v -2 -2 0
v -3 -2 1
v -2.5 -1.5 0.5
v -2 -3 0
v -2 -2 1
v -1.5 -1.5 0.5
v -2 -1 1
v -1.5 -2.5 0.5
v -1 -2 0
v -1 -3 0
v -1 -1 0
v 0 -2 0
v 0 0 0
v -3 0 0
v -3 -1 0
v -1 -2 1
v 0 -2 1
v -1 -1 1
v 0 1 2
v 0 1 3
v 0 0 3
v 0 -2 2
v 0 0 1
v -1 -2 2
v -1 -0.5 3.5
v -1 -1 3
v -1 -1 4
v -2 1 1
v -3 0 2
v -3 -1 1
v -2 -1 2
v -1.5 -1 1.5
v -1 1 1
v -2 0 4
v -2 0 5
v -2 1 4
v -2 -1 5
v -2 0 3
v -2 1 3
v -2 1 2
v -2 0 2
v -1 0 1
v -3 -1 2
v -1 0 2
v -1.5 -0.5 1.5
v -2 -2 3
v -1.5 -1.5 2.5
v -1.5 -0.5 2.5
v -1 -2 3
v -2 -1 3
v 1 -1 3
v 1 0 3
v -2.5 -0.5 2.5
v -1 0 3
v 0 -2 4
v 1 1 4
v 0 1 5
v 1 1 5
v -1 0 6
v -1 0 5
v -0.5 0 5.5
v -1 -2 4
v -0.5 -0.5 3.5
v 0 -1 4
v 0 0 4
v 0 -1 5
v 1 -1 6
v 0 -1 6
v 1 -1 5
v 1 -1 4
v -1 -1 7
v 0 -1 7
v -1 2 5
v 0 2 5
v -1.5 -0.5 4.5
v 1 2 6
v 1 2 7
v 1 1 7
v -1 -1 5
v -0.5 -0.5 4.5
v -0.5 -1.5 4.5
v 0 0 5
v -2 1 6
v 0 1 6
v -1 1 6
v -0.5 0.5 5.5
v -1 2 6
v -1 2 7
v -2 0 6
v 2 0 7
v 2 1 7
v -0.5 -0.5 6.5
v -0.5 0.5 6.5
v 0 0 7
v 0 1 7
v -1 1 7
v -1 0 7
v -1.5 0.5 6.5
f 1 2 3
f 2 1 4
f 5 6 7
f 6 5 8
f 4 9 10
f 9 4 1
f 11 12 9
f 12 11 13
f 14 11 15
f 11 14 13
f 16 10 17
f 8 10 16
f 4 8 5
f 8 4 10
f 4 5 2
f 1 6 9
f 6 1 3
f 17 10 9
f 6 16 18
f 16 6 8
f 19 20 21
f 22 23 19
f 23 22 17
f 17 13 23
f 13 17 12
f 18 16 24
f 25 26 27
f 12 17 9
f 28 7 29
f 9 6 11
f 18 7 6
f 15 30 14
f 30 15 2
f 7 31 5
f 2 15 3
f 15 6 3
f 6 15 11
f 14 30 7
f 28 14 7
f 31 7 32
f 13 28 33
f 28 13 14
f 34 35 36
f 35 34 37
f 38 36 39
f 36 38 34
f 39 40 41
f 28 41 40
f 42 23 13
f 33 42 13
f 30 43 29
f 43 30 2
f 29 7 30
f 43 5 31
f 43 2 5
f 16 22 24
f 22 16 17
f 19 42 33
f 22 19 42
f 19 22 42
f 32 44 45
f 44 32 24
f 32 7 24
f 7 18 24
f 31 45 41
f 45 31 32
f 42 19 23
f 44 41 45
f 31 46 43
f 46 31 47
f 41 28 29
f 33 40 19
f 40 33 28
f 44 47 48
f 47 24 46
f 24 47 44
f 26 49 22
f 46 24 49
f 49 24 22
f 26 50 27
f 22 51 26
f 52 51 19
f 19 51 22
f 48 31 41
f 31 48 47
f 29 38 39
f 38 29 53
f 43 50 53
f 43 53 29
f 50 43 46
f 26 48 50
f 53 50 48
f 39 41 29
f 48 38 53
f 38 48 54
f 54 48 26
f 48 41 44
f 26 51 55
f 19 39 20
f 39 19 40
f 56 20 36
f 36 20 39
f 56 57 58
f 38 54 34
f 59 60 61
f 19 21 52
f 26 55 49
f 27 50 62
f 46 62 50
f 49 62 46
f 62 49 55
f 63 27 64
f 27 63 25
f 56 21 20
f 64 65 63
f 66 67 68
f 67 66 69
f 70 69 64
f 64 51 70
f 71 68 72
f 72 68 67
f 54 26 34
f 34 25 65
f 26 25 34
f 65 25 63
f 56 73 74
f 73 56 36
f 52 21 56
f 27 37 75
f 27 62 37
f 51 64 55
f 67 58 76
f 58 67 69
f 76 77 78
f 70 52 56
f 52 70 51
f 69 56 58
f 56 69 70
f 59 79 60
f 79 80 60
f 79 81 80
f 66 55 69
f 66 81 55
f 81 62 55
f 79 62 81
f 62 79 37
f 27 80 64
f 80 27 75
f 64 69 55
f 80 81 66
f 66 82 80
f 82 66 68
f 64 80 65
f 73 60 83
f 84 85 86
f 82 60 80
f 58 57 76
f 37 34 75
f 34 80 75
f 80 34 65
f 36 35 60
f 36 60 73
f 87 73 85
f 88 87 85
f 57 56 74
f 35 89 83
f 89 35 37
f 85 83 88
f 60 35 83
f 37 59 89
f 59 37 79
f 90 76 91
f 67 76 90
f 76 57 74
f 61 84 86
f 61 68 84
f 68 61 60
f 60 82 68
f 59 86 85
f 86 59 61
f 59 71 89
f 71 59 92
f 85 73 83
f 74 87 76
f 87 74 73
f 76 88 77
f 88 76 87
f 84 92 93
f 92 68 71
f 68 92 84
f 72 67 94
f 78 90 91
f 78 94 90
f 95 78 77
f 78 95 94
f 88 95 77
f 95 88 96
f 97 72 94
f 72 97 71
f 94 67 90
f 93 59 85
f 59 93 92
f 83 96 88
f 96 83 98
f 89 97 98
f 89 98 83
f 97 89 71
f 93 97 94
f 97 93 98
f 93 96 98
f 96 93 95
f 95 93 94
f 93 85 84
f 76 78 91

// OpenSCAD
module skew_cube(a,b) {
	multmatrix(m = [
		[1, 0, a, 0],
		[0, 1, b, 0],
		[0, 0, 1, 0]
	]) cube(size=1.00001);
}

module span_cube(x1,y1,x2,y2,z) {
	translate(v=[x1,y1,z])
	skew_cube(x2-x1,y2-y1);
}


union() {
span_cube(-2,-3,-3,-2,0);
span_cube(-2,-3,-1,-2,0);
span_cube(-1,-2,-1,-2,0);
span_cube(-1,-2,-2,-1,0);
span_cube(-1,-2,-1,-1,0);
span_cube(-3,-1,-3,-2,0);
span_cube(-3,-1,-2,-1,0);
span_cube(-3,-1,-2,0,0);
span_cube(-2,-1,-3,-2,0);
span_cube(-2,-1,-1,-2,0);
span_cube(-2,-1,-2,-1,0);
span_cube(-2,-1,-1,-1,0);
span_cube(-2,-1,-2,0,0);
span_cube(-1,-1,-1,-2,0);
span_cube(-1,-1,-2,-1,0);
span_cube(-1,-1,-1,-1,0);
span_cube(-1,-1,-2,0,0);
span_cube(-3,-2,-3,-1,1);
span_cube(-1,-2,-1,-2,1);
span_cube(-1,-2,-1,-1,1);
span_cube(-2,-1,-1,-2,1);
span_cube(-2,-1,-3,-1,1);
span_cube(-2,-1,-1,-1,1);
span_cube(-2,-1,-2,0,1);
span_cube(-2,-1,-1,0,1);
span_cube(-1,-1,-1,-2,1);
span_cube(-1,-1,-1,-1,1);
span_cube(-1,-1,-2,0,1);
span_cube(-1,-1,-1,0,1);
span_cube(-2,0,-3,-1,1);
span_cube(-2,0,-1,-1,1);
span_cube(-2,0,-2,0,1);
span_cube(-2,0,-1,0,1);
span_cube(-1,-2,-2,-2,2);
span_cube(-1,-2,-1,-1,2);
span_cube(-1,-2,0,-1,2);
span_cube(-3,-1,-2,-2,2);
span_cube(-3,-1,-2,0,2);
span_cube(-1,-1,-2,-2,2);
span_cube(-1,-1,-1,-1,2);
span_cube(-1,-1,0,-1,2);
span_cube(-1,-1,-2,0,2);
span_cube(-1,-1,-1,0,2);
span_cube(-2,0,-1,-1,2);
span_cube(-2,0,-2,0,2);
span_cube(-2,0,-1,0,2);
span_cube(-1,0,-1,-1,2);
span_cube(-1,0,0,-1,2);
span_cube(-1,0,-2,0,2);
span_cube(-1,0,-1,0,2);
span_cube(-2,-2,-1,-2,3);
span_cube(-1,-1,-1,-2,3);
span_cube(-1,-1,0,-1,3);
span_cube(-1,-1,-2,0,3);
span_cube(-1,-1,-1,0,3);
span_cube(-1,-1,0,0,3);
span_cube(0,-1,-1,-2,3);
span_cube(0,-1,0,-1,3);
span_cube(0,-1,-1,0,3);
span_cube(0,-1,0,0,3);
span_cube(-2,0,-2,0,3);
span_cube(-2,0,-1,0,3);
span_cube(-1,0,0,-1,3);
span_cube(-1,0,-2,0,3);
span_cube(-1,0,-1,0,3);
span_cube(-1,0,0,0,3);
span_cube(-1,-2,-2,-1,4);
span_cube(-1,-2,0,-1,4);
span_cube(0,-1,0,-1,4);
span_cube(0,-1,-1,0,4);
span_cube(0,-1,0,0,4);
span_cube(-2,0,-2,-1,4);
span_cube(-2,0,-1,0,4);
span_cube(-2,0,-1,1,4);
span_cube(-1,0,-2,-1,4);
span_cube(-1,0,0,-1,4);
span_cube(-1,0,-1,0,4);
span_cube(-1,0,0,0,4);
span_cube(-1,0,-1,1,4);
span_cube(0,0,0,-1,4);
span_cube(0,0,-1,0,4);
span_cube(0,0,0,0,4);
span_cube(0,0,-1,1,4);
span_cube(-2,-1,-2,0,5);
span_cube(0,-1,0,-1,5);
span_cube(0,-1,0,0,5);
span_cube(-1,0,0,-1,5);
span_cube(-1,0,-2,0,5);
span_cube(-1,0,0,0,5);
span_cube(-1,0,-1,1,5);
span_cube(-1,0,0,1,5);
span_cube(0,0,0,-1,5);
span_cube(0,0,0,0,5);
span_cube(0,0,-1,1,5);
span_cube(0,0,0,1,5);
span_cube(-1,1,-2,0,5);
span_cube(-1,1,0,0,5);
span_cube(-1,1,-1,1,5);
span_cube(-1,1,0,1,5);
span_cube(0,-1,-1,-1,6);
span_cube(0,-1,0,0,6);
span_cube(0,-1,1,0,6);
span_cube(-2,0,-1,-1,6);
span_cube(-2,0,-1,1,6);
span_cube(0,0,-1,-1,6);
span_cube(0,0,0,0,6);
span_cube(0,0,1,0,6);
span_cube(0,0,-1,1,6);
span_cube(0,0,0,1,6);
span_cube(-1,1,0,0,6);
span_cube(-1,1,-1,1,6);
span_cube(-1,1,0,1,6);
span_cube(0,1,0,0,6);
span_cube(0,1,1,0,6);
span_cube(0,1,-1,1,6);
span_cube(0,1,0,1,6);
}
